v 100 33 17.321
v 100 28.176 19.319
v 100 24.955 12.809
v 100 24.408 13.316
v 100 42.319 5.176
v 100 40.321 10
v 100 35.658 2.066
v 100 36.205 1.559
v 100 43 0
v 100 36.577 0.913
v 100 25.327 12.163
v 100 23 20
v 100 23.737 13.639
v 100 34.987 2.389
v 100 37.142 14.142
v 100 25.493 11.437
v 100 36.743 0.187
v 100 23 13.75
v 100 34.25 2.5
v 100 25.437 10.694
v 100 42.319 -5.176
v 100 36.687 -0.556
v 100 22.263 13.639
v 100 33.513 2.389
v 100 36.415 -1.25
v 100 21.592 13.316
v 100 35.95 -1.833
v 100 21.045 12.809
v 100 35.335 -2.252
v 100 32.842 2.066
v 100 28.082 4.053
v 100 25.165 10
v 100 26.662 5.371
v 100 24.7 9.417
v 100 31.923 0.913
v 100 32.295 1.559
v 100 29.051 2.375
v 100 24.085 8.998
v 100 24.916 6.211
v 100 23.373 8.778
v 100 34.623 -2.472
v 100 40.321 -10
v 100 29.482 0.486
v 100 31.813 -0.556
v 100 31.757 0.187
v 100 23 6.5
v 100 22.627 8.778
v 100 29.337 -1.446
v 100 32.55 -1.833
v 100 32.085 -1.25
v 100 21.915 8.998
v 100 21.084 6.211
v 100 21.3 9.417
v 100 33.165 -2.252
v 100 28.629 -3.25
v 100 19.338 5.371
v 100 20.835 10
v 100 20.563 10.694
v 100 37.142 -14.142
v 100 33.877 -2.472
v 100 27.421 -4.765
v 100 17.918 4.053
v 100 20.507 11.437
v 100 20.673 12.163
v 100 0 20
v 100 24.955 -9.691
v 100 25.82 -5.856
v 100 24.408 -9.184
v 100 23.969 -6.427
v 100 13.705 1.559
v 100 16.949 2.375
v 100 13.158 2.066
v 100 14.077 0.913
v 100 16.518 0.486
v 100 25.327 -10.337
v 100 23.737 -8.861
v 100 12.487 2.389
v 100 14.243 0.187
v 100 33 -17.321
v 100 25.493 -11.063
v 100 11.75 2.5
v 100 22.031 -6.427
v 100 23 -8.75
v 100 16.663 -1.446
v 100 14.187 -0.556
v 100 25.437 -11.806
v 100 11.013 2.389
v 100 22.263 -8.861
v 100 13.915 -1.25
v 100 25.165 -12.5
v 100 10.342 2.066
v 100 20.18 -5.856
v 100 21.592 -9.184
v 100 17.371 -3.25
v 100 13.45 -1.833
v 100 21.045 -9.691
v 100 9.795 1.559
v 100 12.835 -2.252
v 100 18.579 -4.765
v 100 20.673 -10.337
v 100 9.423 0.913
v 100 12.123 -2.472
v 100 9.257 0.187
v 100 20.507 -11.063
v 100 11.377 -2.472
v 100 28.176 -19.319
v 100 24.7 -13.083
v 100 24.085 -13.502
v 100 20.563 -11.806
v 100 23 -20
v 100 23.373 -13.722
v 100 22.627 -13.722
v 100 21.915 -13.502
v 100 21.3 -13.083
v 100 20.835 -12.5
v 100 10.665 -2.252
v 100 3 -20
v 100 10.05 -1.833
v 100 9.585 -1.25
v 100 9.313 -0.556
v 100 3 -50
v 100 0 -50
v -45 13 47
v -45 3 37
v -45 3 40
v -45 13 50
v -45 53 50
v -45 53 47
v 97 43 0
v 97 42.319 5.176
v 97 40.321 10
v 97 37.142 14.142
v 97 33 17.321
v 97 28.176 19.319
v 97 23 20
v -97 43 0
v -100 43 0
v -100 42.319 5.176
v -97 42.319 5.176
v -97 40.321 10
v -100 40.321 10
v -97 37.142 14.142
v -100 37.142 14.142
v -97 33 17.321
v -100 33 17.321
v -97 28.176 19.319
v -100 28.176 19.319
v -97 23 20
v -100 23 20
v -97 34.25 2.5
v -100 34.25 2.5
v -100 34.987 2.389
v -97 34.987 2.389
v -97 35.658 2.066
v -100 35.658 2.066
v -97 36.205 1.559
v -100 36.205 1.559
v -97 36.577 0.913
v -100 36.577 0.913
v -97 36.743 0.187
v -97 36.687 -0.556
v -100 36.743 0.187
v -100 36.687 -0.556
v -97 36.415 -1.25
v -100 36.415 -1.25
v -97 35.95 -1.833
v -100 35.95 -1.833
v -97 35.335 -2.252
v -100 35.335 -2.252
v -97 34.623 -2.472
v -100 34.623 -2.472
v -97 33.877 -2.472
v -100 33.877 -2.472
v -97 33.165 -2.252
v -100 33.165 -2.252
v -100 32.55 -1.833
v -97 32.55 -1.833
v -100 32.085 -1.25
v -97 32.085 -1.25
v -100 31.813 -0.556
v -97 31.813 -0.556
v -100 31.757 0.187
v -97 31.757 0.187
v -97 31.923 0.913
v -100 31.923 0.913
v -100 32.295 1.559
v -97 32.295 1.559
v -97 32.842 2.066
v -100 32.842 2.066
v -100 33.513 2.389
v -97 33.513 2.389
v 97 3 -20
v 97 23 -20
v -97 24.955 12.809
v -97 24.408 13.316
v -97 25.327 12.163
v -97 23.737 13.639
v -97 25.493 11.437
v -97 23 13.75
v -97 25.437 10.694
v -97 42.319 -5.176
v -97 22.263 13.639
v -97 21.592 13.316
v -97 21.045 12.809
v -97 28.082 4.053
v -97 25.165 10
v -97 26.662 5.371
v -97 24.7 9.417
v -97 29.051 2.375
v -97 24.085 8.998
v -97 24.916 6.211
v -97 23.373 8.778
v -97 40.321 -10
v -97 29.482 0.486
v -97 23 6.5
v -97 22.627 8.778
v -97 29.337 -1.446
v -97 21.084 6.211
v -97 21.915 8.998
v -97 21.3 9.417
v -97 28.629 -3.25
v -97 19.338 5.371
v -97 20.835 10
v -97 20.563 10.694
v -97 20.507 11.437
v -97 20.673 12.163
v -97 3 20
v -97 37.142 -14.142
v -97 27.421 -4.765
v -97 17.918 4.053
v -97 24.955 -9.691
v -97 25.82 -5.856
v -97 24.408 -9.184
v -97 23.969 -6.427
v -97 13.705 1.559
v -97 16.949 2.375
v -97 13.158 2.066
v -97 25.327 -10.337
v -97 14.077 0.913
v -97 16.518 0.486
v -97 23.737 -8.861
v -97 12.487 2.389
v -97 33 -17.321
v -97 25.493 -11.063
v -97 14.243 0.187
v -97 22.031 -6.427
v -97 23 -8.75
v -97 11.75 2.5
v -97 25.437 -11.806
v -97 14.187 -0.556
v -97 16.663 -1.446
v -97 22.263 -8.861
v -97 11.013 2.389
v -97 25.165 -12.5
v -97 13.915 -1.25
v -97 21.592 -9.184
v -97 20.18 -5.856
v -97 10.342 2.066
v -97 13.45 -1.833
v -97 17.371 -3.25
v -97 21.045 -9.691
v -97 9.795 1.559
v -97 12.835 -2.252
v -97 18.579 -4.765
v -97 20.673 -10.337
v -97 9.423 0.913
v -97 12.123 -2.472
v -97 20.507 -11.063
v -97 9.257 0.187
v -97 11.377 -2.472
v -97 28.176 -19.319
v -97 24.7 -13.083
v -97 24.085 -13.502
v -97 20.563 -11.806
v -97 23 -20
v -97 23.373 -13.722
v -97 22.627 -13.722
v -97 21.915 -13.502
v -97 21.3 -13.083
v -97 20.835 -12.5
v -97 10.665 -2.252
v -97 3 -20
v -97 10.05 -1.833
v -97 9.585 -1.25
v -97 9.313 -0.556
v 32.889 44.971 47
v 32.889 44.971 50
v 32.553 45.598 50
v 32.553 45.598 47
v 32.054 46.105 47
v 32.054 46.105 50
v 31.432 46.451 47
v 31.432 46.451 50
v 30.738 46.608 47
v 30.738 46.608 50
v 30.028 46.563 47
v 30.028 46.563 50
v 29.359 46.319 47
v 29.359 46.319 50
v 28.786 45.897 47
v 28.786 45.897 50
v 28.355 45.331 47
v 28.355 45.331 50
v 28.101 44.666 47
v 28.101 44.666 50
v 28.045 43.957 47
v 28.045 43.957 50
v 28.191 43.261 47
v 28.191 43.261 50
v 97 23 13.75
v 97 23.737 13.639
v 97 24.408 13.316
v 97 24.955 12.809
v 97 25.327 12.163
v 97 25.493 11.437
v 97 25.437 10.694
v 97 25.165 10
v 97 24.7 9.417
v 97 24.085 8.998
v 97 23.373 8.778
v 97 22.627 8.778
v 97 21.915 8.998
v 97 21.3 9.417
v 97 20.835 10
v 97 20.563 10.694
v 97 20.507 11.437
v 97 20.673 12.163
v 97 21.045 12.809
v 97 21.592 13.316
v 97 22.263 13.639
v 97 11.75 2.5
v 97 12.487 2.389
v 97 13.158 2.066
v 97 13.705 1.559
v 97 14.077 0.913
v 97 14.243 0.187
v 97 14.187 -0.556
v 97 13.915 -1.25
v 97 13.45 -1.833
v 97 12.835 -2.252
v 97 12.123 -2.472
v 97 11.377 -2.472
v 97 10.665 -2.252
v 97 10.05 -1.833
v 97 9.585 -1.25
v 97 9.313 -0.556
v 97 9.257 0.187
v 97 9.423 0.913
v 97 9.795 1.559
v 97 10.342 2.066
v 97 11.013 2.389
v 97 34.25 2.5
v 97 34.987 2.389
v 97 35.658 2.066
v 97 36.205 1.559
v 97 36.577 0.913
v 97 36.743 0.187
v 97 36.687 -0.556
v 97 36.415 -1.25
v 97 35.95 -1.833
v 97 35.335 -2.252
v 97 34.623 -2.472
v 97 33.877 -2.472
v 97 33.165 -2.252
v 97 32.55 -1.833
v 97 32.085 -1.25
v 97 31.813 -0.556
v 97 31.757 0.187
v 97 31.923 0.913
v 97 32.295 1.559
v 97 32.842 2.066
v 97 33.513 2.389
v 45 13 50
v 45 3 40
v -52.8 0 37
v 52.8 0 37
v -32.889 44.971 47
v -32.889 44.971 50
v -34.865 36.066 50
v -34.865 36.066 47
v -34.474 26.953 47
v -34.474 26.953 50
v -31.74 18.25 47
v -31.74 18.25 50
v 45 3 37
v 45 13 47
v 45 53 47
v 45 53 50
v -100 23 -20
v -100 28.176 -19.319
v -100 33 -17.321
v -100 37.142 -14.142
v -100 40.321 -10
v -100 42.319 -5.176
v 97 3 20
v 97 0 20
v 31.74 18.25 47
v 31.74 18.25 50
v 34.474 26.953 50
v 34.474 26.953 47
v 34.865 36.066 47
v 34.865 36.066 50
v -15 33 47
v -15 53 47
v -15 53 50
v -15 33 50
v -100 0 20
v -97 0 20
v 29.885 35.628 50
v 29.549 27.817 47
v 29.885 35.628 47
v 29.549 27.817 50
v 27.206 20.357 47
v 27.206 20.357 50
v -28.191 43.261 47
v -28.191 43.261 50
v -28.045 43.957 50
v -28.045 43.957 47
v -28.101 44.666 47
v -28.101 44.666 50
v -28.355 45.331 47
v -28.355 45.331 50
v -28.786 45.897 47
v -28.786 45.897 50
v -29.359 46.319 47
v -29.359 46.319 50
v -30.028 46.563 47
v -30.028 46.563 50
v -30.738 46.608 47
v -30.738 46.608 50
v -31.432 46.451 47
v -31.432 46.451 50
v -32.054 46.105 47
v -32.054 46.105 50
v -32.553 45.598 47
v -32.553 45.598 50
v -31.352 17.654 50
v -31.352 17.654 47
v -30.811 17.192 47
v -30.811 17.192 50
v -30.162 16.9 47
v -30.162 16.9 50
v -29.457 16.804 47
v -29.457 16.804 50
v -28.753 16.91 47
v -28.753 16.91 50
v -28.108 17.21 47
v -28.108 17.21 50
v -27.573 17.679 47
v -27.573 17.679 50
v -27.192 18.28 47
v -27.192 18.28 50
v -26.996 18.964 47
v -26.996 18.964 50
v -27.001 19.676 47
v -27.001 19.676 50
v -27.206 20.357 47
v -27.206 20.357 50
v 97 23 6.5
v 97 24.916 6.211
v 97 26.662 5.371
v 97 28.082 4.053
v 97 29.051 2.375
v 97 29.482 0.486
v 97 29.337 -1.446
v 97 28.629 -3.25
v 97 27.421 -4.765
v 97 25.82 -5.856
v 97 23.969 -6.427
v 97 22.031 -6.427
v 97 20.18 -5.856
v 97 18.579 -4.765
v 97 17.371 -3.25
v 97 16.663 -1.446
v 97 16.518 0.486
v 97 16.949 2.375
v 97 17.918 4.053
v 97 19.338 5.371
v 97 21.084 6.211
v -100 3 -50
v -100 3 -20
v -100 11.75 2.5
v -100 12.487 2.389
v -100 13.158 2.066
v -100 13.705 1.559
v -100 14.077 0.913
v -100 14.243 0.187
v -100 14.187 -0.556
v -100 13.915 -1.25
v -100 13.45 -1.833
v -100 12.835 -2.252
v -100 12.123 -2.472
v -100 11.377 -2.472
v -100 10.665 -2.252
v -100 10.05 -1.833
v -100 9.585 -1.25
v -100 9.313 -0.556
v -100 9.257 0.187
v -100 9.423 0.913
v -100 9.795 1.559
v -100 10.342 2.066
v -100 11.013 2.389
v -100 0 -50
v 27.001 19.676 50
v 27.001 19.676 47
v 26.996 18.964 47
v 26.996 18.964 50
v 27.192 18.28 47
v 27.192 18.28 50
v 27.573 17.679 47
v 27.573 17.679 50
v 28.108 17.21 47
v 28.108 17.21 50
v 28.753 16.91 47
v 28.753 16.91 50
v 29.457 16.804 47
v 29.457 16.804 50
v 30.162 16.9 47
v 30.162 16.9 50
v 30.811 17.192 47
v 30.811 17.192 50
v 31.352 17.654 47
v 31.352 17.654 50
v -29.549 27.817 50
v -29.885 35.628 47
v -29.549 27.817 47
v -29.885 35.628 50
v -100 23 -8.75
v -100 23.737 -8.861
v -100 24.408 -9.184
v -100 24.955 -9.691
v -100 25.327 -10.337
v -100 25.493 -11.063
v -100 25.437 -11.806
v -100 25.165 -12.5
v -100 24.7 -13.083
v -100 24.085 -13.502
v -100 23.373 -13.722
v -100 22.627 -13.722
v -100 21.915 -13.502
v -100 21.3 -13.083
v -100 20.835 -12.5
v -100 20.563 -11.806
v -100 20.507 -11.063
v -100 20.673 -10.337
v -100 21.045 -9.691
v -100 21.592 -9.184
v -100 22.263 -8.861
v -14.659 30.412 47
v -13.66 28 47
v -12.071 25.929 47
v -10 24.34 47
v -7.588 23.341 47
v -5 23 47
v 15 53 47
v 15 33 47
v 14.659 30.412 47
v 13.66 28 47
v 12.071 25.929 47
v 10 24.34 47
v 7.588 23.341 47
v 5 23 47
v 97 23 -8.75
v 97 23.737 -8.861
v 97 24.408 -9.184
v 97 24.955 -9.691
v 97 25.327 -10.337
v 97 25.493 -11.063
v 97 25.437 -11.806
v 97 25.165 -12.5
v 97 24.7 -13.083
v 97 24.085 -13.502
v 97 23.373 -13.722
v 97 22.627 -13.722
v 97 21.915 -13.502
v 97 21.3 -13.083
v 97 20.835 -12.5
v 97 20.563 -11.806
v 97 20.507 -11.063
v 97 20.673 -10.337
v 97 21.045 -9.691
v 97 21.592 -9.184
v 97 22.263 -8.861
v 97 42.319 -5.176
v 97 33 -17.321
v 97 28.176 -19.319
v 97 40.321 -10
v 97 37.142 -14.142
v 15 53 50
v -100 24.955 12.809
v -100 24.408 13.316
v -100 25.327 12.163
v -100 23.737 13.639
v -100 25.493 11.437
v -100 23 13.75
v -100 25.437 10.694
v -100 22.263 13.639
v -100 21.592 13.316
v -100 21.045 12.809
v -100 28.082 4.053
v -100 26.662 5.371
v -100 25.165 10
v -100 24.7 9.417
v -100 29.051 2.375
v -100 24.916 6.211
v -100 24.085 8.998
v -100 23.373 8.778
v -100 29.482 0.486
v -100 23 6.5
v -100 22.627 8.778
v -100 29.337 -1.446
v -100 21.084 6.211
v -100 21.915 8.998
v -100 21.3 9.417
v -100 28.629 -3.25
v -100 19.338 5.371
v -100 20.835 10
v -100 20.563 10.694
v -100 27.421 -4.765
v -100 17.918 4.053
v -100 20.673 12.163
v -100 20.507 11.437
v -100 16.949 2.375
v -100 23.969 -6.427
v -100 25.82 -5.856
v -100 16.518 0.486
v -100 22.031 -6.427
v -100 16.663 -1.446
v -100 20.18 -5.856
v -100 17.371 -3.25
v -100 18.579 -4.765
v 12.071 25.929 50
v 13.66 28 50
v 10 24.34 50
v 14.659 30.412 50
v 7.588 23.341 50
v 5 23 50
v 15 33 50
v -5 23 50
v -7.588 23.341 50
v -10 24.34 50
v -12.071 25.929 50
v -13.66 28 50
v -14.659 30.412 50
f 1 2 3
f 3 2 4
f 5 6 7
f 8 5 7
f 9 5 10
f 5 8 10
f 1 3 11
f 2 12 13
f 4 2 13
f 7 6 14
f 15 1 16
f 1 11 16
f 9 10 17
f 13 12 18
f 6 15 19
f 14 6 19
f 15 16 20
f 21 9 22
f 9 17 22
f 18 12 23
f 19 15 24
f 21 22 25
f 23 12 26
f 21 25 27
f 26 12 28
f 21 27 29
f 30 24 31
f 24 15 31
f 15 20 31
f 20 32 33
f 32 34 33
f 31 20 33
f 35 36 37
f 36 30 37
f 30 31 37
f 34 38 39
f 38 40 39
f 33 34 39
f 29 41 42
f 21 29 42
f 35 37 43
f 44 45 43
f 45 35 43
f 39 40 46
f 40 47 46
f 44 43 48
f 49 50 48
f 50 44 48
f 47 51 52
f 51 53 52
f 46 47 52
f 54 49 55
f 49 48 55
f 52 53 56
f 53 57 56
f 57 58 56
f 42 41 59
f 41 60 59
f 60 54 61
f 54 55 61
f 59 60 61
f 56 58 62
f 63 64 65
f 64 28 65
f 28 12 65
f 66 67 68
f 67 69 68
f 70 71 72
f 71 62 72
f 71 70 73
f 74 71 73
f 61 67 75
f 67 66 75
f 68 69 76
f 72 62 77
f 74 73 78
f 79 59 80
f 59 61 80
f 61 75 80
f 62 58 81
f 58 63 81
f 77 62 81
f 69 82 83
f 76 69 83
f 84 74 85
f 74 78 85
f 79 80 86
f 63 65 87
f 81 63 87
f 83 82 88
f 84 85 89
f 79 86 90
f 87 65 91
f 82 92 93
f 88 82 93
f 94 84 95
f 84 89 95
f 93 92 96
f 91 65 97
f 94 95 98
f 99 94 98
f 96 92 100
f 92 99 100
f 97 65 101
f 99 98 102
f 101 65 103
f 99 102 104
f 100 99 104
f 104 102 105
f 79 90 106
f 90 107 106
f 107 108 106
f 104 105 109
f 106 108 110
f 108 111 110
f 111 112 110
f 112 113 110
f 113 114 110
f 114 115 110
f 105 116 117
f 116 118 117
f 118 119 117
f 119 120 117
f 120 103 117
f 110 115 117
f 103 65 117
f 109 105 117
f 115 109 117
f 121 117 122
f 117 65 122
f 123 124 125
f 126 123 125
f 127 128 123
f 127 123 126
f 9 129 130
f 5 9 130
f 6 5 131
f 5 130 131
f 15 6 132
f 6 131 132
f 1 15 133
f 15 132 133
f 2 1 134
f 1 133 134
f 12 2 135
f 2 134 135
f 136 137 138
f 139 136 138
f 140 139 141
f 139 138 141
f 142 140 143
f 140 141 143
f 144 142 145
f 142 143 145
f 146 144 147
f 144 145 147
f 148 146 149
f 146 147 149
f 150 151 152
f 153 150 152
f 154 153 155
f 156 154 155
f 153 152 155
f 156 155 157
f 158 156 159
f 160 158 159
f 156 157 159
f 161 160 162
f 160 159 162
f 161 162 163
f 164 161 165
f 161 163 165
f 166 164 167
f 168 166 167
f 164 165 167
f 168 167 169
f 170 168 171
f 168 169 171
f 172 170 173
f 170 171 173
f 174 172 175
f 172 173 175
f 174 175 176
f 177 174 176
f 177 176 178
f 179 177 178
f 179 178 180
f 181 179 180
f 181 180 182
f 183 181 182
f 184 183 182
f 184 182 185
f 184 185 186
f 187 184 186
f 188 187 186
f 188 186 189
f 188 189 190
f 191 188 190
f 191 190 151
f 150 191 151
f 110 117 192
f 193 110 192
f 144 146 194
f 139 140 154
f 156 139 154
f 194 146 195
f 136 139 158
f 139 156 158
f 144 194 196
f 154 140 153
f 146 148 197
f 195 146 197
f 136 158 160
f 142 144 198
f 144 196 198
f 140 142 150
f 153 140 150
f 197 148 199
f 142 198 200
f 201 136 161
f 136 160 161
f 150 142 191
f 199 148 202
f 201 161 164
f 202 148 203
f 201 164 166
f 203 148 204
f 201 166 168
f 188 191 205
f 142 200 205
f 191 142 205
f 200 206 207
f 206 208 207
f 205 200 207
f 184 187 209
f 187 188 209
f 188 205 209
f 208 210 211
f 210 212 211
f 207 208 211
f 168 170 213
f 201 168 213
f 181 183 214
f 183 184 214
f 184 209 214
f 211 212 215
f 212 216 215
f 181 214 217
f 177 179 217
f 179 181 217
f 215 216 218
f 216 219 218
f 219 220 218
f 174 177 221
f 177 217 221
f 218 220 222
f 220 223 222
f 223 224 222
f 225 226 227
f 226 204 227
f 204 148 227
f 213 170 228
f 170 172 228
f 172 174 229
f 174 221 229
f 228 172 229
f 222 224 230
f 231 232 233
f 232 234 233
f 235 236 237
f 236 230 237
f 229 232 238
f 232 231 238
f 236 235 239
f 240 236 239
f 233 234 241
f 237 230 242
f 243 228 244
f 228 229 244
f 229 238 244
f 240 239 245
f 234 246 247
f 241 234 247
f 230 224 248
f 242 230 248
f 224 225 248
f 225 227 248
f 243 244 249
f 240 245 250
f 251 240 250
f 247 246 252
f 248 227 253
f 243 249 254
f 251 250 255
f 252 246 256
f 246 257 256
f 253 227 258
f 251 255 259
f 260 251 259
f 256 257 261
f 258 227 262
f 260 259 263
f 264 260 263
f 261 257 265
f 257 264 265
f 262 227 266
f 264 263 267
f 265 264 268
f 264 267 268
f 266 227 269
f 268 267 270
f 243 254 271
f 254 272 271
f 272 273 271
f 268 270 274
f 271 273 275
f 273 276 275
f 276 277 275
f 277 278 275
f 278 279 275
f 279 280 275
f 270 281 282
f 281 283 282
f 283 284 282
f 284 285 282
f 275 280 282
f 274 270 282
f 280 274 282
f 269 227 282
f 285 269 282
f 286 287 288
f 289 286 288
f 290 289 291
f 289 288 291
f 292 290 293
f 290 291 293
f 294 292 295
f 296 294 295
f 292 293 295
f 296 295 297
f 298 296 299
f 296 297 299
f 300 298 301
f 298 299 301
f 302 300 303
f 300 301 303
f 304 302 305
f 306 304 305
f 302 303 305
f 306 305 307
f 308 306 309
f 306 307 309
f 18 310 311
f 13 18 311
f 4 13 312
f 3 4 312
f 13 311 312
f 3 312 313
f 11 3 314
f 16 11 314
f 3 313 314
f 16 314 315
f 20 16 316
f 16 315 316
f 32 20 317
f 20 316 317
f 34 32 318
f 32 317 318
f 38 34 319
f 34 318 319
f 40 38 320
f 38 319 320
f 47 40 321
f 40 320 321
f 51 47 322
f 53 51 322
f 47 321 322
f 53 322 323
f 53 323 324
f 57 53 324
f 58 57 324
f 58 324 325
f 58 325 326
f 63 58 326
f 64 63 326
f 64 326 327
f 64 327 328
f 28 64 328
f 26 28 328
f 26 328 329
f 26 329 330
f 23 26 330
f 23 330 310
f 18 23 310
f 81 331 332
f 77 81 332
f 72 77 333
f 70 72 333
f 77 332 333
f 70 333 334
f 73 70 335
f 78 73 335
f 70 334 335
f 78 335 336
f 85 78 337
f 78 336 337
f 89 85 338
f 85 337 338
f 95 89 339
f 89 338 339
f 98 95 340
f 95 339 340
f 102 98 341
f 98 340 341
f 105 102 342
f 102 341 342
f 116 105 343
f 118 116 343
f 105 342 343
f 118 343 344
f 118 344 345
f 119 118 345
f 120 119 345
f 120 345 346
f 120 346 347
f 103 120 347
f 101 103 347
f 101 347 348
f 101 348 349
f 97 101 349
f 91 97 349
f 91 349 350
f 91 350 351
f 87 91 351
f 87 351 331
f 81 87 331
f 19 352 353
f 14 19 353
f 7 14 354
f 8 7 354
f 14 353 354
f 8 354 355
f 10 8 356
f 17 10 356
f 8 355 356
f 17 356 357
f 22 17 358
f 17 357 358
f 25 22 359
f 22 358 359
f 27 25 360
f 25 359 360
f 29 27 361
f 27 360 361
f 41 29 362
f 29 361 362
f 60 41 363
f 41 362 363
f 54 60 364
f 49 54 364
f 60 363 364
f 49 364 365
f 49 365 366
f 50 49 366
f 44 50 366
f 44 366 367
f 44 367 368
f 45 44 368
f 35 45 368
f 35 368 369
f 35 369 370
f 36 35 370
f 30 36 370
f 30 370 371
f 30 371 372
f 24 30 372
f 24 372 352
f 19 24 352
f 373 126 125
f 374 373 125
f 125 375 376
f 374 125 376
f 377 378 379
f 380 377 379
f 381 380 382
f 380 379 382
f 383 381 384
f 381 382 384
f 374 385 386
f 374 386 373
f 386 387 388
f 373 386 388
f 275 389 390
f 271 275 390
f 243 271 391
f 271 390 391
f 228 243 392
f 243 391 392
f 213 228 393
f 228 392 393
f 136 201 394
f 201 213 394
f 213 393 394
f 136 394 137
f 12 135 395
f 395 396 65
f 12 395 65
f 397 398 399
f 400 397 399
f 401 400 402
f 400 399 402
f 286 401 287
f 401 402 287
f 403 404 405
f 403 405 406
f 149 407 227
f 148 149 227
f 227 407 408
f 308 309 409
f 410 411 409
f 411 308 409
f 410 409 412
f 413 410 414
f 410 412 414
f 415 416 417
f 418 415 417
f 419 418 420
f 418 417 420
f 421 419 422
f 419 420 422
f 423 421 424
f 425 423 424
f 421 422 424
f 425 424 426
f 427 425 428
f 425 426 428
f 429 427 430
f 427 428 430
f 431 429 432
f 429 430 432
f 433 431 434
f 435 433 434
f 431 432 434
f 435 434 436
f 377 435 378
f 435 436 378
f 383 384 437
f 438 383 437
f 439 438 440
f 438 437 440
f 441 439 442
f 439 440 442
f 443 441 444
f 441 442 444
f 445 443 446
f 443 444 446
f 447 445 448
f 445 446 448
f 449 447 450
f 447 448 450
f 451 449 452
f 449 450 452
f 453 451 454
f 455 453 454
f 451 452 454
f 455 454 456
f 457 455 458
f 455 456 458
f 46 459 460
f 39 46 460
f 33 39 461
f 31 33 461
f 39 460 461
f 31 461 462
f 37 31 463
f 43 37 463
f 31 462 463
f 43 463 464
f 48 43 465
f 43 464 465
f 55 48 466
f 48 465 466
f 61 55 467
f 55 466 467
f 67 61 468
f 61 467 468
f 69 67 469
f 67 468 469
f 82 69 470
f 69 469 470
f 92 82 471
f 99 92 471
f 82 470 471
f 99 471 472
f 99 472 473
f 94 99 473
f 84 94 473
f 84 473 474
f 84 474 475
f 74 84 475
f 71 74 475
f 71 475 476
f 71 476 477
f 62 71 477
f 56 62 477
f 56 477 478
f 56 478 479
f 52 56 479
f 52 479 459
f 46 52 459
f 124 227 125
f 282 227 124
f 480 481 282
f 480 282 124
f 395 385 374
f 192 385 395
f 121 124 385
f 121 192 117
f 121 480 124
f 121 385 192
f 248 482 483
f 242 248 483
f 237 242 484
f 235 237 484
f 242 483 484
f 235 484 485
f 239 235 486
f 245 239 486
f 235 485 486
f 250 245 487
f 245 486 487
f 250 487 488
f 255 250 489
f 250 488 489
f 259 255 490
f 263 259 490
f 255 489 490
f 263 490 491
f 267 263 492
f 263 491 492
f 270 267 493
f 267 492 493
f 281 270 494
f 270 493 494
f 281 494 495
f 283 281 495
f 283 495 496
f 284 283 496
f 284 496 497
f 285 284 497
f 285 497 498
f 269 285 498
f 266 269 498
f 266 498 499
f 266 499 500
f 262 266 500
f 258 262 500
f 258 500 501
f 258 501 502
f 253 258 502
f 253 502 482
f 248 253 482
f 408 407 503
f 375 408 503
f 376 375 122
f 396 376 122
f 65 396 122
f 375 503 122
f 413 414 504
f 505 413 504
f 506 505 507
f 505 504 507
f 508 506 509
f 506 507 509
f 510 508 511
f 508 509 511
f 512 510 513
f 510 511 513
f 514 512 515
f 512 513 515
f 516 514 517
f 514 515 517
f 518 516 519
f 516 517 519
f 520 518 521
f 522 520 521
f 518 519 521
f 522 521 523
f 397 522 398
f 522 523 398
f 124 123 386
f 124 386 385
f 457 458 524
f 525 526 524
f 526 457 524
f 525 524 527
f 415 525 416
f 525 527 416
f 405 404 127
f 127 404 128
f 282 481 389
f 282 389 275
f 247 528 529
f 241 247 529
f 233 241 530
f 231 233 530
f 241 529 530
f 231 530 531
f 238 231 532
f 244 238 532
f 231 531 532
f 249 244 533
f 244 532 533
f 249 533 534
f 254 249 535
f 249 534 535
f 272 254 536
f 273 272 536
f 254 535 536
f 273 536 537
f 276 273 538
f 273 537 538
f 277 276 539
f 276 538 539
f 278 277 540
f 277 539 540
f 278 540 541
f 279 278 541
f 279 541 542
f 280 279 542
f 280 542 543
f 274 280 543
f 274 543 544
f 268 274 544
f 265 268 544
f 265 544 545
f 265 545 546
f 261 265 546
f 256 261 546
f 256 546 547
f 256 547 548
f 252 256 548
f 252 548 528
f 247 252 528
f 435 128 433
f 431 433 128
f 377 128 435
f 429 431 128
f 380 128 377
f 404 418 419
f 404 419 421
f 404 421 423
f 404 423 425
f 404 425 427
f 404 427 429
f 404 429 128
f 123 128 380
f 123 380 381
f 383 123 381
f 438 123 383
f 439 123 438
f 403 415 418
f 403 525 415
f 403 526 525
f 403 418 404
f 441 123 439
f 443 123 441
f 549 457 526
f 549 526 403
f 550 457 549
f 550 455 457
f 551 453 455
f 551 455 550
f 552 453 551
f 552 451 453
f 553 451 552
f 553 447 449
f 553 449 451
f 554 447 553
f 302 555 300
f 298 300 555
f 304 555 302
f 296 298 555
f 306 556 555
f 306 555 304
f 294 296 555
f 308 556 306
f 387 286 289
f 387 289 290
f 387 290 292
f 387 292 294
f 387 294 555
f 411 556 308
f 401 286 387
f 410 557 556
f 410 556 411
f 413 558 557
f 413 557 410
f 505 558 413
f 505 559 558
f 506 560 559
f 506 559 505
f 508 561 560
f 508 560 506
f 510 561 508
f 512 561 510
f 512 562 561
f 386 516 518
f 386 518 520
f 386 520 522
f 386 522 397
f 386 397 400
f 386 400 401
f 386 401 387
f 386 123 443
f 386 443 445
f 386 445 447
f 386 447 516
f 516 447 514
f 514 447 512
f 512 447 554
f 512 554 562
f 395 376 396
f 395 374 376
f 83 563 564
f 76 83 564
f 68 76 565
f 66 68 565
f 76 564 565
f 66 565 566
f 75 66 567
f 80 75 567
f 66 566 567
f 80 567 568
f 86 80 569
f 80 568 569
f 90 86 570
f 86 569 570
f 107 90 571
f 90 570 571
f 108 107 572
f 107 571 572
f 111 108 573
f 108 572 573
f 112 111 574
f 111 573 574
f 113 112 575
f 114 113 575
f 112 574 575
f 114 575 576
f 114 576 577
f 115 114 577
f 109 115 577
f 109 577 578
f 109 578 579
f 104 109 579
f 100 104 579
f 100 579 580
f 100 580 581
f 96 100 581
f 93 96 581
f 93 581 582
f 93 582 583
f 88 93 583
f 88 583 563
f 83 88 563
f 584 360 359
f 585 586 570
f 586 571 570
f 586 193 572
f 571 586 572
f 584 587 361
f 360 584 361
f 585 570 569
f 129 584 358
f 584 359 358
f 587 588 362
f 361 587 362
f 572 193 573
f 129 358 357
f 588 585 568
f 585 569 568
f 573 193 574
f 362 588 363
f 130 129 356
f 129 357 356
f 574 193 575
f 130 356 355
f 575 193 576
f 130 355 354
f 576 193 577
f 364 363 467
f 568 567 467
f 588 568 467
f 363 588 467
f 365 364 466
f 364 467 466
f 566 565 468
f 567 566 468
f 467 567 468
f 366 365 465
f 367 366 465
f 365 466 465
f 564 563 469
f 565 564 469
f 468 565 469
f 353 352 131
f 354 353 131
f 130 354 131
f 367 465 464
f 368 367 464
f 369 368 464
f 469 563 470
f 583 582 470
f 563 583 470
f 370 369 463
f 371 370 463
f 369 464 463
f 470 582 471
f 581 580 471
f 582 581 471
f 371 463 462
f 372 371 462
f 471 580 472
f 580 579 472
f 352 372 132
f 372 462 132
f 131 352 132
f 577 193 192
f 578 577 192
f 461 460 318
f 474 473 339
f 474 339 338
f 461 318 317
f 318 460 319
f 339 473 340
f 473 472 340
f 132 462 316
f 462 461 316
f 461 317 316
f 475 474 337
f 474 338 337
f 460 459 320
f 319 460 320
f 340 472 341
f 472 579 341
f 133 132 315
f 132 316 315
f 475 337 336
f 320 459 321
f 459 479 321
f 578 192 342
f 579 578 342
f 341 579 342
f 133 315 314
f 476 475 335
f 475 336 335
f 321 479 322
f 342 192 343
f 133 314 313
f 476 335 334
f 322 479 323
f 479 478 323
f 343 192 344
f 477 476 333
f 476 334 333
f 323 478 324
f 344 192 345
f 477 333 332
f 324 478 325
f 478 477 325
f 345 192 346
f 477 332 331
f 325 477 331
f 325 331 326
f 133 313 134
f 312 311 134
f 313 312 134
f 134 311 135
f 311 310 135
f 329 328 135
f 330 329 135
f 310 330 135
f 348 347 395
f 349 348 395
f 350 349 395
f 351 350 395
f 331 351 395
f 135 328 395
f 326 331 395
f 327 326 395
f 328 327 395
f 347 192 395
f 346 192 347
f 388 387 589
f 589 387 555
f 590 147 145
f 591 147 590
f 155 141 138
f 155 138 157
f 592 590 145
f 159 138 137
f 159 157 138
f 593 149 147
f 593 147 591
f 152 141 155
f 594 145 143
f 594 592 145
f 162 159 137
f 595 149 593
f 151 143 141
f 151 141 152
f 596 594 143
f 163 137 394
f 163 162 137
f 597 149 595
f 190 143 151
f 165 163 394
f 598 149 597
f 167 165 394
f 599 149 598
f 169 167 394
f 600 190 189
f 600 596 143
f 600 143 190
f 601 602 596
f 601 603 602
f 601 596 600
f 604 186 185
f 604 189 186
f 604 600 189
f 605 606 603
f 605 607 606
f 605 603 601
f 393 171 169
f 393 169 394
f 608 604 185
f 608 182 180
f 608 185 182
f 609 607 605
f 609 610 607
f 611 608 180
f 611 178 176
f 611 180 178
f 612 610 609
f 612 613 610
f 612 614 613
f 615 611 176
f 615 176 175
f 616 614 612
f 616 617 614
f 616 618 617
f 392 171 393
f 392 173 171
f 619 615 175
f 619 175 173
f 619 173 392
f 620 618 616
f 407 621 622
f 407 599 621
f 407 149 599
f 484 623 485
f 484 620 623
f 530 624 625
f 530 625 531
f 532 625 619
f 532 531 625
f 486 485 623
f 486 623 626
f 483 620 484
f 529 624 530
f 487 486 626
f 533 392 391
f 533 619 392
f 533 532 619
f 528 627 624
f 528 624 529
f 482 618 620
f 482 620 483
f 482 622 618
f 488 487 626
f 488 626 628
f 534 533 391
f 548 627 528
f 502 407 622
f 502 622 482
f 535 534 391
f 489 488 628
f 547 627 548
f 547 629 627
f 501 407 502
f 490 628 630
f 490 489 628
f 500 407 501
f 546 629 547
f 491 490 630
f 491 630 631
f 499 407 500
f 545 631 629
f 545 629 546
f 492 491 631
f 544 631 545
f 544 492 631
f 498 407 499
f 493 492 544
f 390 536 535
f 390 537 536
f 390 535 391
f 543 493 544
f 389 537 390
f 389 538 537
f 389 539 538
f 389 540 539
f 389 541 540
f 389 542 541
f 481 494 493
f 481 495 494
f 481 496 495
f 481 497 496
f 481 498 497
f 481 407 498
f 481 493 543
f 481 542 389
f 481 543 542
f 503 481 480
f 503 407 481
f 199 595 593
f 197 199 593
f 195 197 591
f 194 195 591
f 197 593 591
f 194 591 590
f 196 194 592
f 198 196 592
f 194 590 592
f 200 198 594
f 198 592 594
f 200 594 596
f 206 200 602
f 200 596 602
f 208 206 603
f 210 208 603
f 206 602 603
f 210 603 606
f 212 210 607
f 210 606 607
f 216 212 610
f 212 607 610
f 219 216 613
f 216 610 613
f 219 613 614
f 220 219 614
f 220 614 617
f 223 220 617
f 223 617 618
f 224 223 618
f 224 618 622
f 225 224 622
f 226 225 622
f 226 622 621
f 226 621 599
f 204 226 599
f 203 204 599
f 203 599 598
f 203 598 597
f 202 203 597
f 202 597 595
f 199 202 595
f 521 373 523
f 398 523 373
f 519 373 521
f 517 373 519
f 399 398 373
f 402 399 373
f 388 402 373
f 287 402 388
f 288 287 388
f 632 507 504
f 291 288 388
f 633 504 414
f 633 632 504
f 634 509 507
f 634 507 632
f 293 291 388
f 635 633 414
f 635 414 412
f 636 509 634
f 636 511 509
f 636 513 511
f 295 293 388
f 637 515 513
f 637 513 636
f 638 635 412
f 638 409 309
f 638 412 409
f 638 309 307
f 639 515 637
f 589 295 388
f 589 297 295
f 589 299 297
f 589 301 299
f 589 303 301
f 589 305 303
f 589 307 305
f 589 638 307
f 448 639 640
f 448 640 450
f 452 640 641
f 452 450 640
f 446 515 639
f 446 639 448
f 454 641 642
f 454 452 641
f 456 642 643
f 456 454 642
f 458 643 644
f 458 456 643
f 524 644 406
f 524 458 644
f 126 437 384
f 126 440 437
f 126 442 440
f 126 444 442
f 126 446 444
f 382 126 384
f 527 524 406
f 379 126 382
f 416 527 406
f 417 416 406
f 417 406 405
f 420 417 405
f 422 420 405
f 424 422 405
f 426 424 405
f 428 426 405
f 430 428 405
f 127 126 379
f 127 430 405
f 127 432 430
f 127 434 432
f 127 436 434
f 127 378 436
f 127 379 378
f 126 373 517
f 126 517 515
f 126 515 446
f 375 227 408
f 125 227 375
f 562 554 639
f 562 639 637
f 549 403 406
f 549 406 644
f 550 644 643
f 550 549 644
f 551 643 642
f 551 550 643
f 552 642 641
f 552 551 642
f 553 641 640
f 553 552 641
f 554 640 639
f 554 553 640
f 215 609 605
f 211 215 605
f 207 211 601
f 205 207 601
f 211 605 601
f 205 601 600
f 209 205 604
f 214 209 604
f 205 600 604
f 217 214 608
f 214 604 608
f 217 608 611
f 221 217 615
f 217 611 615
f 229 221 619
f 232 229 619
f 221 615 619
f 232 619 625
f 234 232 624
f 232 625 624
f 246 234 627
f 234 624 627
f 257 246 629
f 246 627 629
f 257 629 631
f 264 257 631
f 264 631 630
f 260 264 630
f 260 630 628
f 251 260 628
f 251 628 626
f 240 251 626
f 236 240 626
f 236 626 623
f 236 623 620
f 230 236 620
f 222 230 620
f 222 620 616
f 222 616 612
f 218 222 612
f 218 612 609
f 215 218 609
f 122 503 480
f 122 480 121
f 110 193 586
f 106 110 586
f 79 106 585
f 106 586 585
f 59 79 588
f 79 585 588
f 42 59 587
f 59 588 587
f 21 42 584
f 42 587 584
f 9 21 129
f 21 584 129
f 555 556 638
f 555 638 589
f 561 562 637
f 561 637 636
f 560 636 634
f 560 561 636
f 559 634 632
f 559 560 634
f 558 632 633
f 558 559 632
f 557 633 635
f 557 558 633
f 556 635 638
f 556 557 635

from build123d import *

# Parameters (mm, degrees)
SKETCH1_W                = 200
SKETCH1_H                = 100
BOSS_EXTRUDE1_DEPTH      = 3
BOSS_EXTRUDE2_DEPTH      = 50
CUT_EXTRUDE1_DEPTH       = 50
CUT_EXTRUDE2_DEPTH       = 152.026487743
CUT_EXTRUDE2_DEPTH_BACK  = 152.026487743
BOSS_EXTRUDE4_DEPTH      = 30
SKETCH7_R                = 6.5
CUT_EXTRUDE4_DEPTH       = 220
SKETCH8_W                = 3
SKETCH8_H                = 40
BOSS_EXTRUDE5_DEPTH      = 10
SKETCH9_R                = 2.5
CUT_EXTRUDE5_DEPTH       = 247
CUT_EXTRUDE6_DEPTH       = 29
CUT_EXTRUDE7_DEPTH       = 29
SKETCH12_W               = 90
SKETCH12_H               = 10
CUT_EXTRUDE9_DEPTH       = 3
BOSS_EXTRUDE6_DEPTH      = 90
CUT_EXTRUDE10_DEPTH      = 90
CUT_EXTRUDE11_DEPTH      = 90
CUT_EXTRUDE12_DEPTH      = 217.5
CUT_EXTRUDE14_DEPTH      = 59
CUT_EXTRUDE14_DEPTH_BACK = 122


with BuildPart() as part:
    # Sketch1 → Boss-Extrude1 (new body)
    with BuildSketch(Plane(origin=(0, 0, 0), x_dir=(1, 0, 0), z_dir=(0, 1, 0))):
        Rectangle(SKETCH1_W, SKETCH1_H)
    extrude(amount=BOSS_EXTRUDE1_DEPTH)

    # Sketch2 → Boss-Extrude2 (add)
    with BuildSketch(Plane(origin=(0, 3, 0), x_dir=(1, 0, 0), z_dir=(0, 1, 0))):
        Polygon((0, -50), (-45, -50), (-45, -47), (45, -47), (45, -50), align=None)
    extrude(amount=BOSS_EXTRUDE2_DEPTH)

    # Sketch3 → Cut-Extrude1 (cut)
    with BuildSketch(Plane.XY.offset(50)):
        with BuildLine():
            ThreePointArc((-32.889241728, 44.970705016), (-34.967685824, 31.496355047), (-31.740232125, 18.250163911))
            ThreePointArc((-31.740232125, 18.250163911), (-28.419512967, 17.036564194), (-27.20591325, 20.357283352))
            ThreePointArc((-27.20591325, 20.357283352), (-29.972302134, 31.711161468), (-28.190778624, 43.2606043))
            ThreePointArc((-28.190778624, 43.2606043), (-29.684959817, 46.46488621), (-32.889241728, 44.970705016))
        make_face()
        with BuildLine():
            ThreePointArc((27.20591325, 20.357283352), (28.419512967, 17.036564194), (31.740232125, 18.250163911))
            ThreePointArc((31.740232125, 18.250163911), (34.967685824, 31.496355047), (32.889241728, 44.970705016))
            ThreePointArc((32.889241728, 44.970705016), (29.684959817, 46.46488621), (28.190778624, 43.2606043))
            ThreePointArc((28.190778624, 43.2606043), (29.972302134, 31.711161468), (27.20591325, 20.357283352))
        make_face()
    extrude(amount=-CUT_EXTRUDE1_DEPTH, mode=Mode.SUBTRACT)

    # Sketch4 → Cut-Extrude2 (cut, two sides: drawn at the far end of the back side and taken through both)
    with BuildSketch(Plane.XY.offset(50).offset(-CUT_EXTRUDE2_DEPTH_BACK)):
        with BuildLine():
            Line((15, 33), (15, 53))
            Line((15, 53), (-15, 53))
            Line((-15, 53), (-15, 33))
            ThreePointArc((-15, 33), (-12.071067812, 25.928932188), (-5, 23))
            Line((-5, 23), (5, 23))
            ThreePointArc((5, 23), (12.071067812, 25.928932188), (15, 33))
        make_face()
    extrude(amount=CUT_EXTRUDE2_DEPTH + CUT_EXTRUDE2_DEPTH_BACK, mode=Mode.SUBTRACT)

    # Sketch5 → Boss-Extrude4 (add)
    with BuildSketch(Plane(origin=(0, 3, 0), x_dir=(1, 0, 0), z_dir=(0, 1, 0))):
        Polygon((-100, 0), (-100, 20), (-97, 20), (-97, -20), (-100, -20), align=None)
        Polygon((100, 0), (100, 20), (97, 20), (97, -20), (100, -20), align=None)
    extrude(amount=BOSS_EXTRUDE4_DEPTH)

    # Sketch7 → Cut-Extrude4 (cut)
    with BuildSketch(Plane.ZY.offset(100)):
        with Locations((0, 23)):
            Circle(SKETCH7_R)
    extrude(amount=-CUT_EXTRUDE4_DEPTH, mode=Mode.SUBTRACT)

    # Sketch8 → Boss-Extrude5 (add)
    with BuildSketch(Plane(origin=(0, 33, 0), x_dir=(1, 0, 0), z_dir=(0, 1, 0))):
        with Locations((-98.5, 0)):
            Rectangle(SKETCH8_W, SKETCH8_H)
        with Locations((98.5, 0)):
            Rectangle(SKETCH8_W, SKETCH8_H)
    extrude(amount=BOSS_EXTRUDE5_DEPTH)

    # Sketch9 → Cut-Extrude5 (cut)
    with BuildSketch(Plane.ZY.offset(100)):
        with Locations((0, 34.25)):
            Circle(SKETCH9_R)
        with Locations((-11.25, 23)):
            Circle(SKETCH9_R)
        with Locations((0, 11.75)):
            Circle(SKETCH9_R)
        with Locations((11.25, 23)):
            Circle(SKETCH9_R)
    extrude(amount=-CUT_EXTRUDE5_DEPTH, mode=Mode.SUBTRACT)

    # Sketch10 → Cut-Extrude6 (cut)
    with BuildSketch(Plane(origin=(0, 3, 0), x_dir=(1, 0, 0), z_dir=(0, 1, 0))):
        Polygon((-45, -50), (-100, -20), (-100, -50), align=None)
    extrude(amount=-CUT_EXTRUDE6_DEPTH, mode=Mode.SUBTRACT)

    # Sketch11 → Cut-Extrude7 (cut)
    with BuildSketch(Plane(origin=(0, 3, 0), x_dir=(1, 0, 0), z_dir=(0, 1, 0))):
        Polygon((45, -50), (100, -20), (100, -50), align=None)
    extrude(amount=-CUT_EXTRUDE7_DEPTH, mode=Mode.SUBTRACT)

    # Sketch12 → Cut-Extrude9 (cut)
    with BuildSketch(Plane.XY.offset(50)):
        with Locations((0, 8)):
            Rectangle(SKETCH12_W, SKETCH12_H)
    extrude(amount=-CUT_EXTRUDE9_DEPTH, mode=Mode.SUBTRACT)


with BuildPart() as cut_extrude9_piece_1:
    # of the separate pieces the step leaves, piece 1, a body of its own (cut_extrude9_pieces)
    add(part.part.solids().sort_by_distance((100, 0, -50))[0])



with BuildPart() as cut_extrude9_piece_2:
    # of the separate pieces the step leaves, piece 2, a body of its own (cut_extrude9_pieces)
    add(part.part.solids().sort_by_distance((-45, 13, 47))[0])


with BuildPart() as cut_extrude9_piece_1_1:
    add(cut_extrude9_piece_1.part)

    add(cut_extrude9_piece_2.part)  # Boss-Extrude6 merges Cut-Extrude9 piece 2
    # Sketch13 → Boss-Extrude6 (add)
    with BuildSketch(Plane.ZY.offset(45)):
        Polygon((47, 13), (37, 3), (47, 3), (50, 3), (50, 13), align=None)
    extrude(amount=-BOSS_EXTRUDE6_DEPTH)

    # Sketch14 → Cut-Extrude10 (cut)
    with BuildSketch(Plane.ZY.offset(45)):
        Polygon((50, 13), (40, 3), (50, 3), align=None)
    extrude(amount=-CUT_EXTRUDE10_DEPTH, mode=Mode.SUBTRACT)

    # Sketch15 → Cut-Extrude11 (cut)
    with BuildSketch(Plane(origin=(0, 3, 0), x_dir=(1, 0, 0), z_dir=(0, 1, 0))):
        Polygon((-100, -20), (-97, -20), (-45, -40), (45, -40), (97, -20), (100, -20), (45, -50), (-45, -50), align=None)
    extrude(amount=-CUT_EXTRUDE11_DEPTH, mode=Mode.SUBTRACT)

    # Sketch16 → Cut-Extrude12 (cut)
    with BuildSketch(Plane.ZY.offset(100)):
        with BuildLine():
            Line((-3.2e-08, 43), (-20, 43))
            Line((-20, 43), (-20, 23))
            ThreePointArc((-20, 23), (-14.142135635, 37.142135612), (-3.2e-08, 43))
        make_face()
        with BuildLine():
            Line((20, 43), (-3.2e-08, 43))
            ThreePointArc((-3.2e-08, 43), (14.142135612, 37.142135635), (20, 23))
            Line((20, 23), (20, 43))
        make_face()
    extrude(amount=-CUT_EXTRUDE12_DEPTH, mode=Mode.SUBTRACT)

    # Sketch17 → Cut-Extrude14 (cut, two sides: drawn at the far end of the back side and taken through both)
    with BuildSketch(Plane.ZY.offset(45).offset(-CUT_EXTRUDE14_DEPTH_BACK)):
        Polygon((40, 3), (40, 0), (37, 0), align=None)
    extrude(amount=CUT_EXTRUDE14_DEPTH + CUT_EXTRUDE14_DEPTH_BACK, mode=Mode.SUBTRACT)


solid = cut_extrude9_piece_1_1.part
